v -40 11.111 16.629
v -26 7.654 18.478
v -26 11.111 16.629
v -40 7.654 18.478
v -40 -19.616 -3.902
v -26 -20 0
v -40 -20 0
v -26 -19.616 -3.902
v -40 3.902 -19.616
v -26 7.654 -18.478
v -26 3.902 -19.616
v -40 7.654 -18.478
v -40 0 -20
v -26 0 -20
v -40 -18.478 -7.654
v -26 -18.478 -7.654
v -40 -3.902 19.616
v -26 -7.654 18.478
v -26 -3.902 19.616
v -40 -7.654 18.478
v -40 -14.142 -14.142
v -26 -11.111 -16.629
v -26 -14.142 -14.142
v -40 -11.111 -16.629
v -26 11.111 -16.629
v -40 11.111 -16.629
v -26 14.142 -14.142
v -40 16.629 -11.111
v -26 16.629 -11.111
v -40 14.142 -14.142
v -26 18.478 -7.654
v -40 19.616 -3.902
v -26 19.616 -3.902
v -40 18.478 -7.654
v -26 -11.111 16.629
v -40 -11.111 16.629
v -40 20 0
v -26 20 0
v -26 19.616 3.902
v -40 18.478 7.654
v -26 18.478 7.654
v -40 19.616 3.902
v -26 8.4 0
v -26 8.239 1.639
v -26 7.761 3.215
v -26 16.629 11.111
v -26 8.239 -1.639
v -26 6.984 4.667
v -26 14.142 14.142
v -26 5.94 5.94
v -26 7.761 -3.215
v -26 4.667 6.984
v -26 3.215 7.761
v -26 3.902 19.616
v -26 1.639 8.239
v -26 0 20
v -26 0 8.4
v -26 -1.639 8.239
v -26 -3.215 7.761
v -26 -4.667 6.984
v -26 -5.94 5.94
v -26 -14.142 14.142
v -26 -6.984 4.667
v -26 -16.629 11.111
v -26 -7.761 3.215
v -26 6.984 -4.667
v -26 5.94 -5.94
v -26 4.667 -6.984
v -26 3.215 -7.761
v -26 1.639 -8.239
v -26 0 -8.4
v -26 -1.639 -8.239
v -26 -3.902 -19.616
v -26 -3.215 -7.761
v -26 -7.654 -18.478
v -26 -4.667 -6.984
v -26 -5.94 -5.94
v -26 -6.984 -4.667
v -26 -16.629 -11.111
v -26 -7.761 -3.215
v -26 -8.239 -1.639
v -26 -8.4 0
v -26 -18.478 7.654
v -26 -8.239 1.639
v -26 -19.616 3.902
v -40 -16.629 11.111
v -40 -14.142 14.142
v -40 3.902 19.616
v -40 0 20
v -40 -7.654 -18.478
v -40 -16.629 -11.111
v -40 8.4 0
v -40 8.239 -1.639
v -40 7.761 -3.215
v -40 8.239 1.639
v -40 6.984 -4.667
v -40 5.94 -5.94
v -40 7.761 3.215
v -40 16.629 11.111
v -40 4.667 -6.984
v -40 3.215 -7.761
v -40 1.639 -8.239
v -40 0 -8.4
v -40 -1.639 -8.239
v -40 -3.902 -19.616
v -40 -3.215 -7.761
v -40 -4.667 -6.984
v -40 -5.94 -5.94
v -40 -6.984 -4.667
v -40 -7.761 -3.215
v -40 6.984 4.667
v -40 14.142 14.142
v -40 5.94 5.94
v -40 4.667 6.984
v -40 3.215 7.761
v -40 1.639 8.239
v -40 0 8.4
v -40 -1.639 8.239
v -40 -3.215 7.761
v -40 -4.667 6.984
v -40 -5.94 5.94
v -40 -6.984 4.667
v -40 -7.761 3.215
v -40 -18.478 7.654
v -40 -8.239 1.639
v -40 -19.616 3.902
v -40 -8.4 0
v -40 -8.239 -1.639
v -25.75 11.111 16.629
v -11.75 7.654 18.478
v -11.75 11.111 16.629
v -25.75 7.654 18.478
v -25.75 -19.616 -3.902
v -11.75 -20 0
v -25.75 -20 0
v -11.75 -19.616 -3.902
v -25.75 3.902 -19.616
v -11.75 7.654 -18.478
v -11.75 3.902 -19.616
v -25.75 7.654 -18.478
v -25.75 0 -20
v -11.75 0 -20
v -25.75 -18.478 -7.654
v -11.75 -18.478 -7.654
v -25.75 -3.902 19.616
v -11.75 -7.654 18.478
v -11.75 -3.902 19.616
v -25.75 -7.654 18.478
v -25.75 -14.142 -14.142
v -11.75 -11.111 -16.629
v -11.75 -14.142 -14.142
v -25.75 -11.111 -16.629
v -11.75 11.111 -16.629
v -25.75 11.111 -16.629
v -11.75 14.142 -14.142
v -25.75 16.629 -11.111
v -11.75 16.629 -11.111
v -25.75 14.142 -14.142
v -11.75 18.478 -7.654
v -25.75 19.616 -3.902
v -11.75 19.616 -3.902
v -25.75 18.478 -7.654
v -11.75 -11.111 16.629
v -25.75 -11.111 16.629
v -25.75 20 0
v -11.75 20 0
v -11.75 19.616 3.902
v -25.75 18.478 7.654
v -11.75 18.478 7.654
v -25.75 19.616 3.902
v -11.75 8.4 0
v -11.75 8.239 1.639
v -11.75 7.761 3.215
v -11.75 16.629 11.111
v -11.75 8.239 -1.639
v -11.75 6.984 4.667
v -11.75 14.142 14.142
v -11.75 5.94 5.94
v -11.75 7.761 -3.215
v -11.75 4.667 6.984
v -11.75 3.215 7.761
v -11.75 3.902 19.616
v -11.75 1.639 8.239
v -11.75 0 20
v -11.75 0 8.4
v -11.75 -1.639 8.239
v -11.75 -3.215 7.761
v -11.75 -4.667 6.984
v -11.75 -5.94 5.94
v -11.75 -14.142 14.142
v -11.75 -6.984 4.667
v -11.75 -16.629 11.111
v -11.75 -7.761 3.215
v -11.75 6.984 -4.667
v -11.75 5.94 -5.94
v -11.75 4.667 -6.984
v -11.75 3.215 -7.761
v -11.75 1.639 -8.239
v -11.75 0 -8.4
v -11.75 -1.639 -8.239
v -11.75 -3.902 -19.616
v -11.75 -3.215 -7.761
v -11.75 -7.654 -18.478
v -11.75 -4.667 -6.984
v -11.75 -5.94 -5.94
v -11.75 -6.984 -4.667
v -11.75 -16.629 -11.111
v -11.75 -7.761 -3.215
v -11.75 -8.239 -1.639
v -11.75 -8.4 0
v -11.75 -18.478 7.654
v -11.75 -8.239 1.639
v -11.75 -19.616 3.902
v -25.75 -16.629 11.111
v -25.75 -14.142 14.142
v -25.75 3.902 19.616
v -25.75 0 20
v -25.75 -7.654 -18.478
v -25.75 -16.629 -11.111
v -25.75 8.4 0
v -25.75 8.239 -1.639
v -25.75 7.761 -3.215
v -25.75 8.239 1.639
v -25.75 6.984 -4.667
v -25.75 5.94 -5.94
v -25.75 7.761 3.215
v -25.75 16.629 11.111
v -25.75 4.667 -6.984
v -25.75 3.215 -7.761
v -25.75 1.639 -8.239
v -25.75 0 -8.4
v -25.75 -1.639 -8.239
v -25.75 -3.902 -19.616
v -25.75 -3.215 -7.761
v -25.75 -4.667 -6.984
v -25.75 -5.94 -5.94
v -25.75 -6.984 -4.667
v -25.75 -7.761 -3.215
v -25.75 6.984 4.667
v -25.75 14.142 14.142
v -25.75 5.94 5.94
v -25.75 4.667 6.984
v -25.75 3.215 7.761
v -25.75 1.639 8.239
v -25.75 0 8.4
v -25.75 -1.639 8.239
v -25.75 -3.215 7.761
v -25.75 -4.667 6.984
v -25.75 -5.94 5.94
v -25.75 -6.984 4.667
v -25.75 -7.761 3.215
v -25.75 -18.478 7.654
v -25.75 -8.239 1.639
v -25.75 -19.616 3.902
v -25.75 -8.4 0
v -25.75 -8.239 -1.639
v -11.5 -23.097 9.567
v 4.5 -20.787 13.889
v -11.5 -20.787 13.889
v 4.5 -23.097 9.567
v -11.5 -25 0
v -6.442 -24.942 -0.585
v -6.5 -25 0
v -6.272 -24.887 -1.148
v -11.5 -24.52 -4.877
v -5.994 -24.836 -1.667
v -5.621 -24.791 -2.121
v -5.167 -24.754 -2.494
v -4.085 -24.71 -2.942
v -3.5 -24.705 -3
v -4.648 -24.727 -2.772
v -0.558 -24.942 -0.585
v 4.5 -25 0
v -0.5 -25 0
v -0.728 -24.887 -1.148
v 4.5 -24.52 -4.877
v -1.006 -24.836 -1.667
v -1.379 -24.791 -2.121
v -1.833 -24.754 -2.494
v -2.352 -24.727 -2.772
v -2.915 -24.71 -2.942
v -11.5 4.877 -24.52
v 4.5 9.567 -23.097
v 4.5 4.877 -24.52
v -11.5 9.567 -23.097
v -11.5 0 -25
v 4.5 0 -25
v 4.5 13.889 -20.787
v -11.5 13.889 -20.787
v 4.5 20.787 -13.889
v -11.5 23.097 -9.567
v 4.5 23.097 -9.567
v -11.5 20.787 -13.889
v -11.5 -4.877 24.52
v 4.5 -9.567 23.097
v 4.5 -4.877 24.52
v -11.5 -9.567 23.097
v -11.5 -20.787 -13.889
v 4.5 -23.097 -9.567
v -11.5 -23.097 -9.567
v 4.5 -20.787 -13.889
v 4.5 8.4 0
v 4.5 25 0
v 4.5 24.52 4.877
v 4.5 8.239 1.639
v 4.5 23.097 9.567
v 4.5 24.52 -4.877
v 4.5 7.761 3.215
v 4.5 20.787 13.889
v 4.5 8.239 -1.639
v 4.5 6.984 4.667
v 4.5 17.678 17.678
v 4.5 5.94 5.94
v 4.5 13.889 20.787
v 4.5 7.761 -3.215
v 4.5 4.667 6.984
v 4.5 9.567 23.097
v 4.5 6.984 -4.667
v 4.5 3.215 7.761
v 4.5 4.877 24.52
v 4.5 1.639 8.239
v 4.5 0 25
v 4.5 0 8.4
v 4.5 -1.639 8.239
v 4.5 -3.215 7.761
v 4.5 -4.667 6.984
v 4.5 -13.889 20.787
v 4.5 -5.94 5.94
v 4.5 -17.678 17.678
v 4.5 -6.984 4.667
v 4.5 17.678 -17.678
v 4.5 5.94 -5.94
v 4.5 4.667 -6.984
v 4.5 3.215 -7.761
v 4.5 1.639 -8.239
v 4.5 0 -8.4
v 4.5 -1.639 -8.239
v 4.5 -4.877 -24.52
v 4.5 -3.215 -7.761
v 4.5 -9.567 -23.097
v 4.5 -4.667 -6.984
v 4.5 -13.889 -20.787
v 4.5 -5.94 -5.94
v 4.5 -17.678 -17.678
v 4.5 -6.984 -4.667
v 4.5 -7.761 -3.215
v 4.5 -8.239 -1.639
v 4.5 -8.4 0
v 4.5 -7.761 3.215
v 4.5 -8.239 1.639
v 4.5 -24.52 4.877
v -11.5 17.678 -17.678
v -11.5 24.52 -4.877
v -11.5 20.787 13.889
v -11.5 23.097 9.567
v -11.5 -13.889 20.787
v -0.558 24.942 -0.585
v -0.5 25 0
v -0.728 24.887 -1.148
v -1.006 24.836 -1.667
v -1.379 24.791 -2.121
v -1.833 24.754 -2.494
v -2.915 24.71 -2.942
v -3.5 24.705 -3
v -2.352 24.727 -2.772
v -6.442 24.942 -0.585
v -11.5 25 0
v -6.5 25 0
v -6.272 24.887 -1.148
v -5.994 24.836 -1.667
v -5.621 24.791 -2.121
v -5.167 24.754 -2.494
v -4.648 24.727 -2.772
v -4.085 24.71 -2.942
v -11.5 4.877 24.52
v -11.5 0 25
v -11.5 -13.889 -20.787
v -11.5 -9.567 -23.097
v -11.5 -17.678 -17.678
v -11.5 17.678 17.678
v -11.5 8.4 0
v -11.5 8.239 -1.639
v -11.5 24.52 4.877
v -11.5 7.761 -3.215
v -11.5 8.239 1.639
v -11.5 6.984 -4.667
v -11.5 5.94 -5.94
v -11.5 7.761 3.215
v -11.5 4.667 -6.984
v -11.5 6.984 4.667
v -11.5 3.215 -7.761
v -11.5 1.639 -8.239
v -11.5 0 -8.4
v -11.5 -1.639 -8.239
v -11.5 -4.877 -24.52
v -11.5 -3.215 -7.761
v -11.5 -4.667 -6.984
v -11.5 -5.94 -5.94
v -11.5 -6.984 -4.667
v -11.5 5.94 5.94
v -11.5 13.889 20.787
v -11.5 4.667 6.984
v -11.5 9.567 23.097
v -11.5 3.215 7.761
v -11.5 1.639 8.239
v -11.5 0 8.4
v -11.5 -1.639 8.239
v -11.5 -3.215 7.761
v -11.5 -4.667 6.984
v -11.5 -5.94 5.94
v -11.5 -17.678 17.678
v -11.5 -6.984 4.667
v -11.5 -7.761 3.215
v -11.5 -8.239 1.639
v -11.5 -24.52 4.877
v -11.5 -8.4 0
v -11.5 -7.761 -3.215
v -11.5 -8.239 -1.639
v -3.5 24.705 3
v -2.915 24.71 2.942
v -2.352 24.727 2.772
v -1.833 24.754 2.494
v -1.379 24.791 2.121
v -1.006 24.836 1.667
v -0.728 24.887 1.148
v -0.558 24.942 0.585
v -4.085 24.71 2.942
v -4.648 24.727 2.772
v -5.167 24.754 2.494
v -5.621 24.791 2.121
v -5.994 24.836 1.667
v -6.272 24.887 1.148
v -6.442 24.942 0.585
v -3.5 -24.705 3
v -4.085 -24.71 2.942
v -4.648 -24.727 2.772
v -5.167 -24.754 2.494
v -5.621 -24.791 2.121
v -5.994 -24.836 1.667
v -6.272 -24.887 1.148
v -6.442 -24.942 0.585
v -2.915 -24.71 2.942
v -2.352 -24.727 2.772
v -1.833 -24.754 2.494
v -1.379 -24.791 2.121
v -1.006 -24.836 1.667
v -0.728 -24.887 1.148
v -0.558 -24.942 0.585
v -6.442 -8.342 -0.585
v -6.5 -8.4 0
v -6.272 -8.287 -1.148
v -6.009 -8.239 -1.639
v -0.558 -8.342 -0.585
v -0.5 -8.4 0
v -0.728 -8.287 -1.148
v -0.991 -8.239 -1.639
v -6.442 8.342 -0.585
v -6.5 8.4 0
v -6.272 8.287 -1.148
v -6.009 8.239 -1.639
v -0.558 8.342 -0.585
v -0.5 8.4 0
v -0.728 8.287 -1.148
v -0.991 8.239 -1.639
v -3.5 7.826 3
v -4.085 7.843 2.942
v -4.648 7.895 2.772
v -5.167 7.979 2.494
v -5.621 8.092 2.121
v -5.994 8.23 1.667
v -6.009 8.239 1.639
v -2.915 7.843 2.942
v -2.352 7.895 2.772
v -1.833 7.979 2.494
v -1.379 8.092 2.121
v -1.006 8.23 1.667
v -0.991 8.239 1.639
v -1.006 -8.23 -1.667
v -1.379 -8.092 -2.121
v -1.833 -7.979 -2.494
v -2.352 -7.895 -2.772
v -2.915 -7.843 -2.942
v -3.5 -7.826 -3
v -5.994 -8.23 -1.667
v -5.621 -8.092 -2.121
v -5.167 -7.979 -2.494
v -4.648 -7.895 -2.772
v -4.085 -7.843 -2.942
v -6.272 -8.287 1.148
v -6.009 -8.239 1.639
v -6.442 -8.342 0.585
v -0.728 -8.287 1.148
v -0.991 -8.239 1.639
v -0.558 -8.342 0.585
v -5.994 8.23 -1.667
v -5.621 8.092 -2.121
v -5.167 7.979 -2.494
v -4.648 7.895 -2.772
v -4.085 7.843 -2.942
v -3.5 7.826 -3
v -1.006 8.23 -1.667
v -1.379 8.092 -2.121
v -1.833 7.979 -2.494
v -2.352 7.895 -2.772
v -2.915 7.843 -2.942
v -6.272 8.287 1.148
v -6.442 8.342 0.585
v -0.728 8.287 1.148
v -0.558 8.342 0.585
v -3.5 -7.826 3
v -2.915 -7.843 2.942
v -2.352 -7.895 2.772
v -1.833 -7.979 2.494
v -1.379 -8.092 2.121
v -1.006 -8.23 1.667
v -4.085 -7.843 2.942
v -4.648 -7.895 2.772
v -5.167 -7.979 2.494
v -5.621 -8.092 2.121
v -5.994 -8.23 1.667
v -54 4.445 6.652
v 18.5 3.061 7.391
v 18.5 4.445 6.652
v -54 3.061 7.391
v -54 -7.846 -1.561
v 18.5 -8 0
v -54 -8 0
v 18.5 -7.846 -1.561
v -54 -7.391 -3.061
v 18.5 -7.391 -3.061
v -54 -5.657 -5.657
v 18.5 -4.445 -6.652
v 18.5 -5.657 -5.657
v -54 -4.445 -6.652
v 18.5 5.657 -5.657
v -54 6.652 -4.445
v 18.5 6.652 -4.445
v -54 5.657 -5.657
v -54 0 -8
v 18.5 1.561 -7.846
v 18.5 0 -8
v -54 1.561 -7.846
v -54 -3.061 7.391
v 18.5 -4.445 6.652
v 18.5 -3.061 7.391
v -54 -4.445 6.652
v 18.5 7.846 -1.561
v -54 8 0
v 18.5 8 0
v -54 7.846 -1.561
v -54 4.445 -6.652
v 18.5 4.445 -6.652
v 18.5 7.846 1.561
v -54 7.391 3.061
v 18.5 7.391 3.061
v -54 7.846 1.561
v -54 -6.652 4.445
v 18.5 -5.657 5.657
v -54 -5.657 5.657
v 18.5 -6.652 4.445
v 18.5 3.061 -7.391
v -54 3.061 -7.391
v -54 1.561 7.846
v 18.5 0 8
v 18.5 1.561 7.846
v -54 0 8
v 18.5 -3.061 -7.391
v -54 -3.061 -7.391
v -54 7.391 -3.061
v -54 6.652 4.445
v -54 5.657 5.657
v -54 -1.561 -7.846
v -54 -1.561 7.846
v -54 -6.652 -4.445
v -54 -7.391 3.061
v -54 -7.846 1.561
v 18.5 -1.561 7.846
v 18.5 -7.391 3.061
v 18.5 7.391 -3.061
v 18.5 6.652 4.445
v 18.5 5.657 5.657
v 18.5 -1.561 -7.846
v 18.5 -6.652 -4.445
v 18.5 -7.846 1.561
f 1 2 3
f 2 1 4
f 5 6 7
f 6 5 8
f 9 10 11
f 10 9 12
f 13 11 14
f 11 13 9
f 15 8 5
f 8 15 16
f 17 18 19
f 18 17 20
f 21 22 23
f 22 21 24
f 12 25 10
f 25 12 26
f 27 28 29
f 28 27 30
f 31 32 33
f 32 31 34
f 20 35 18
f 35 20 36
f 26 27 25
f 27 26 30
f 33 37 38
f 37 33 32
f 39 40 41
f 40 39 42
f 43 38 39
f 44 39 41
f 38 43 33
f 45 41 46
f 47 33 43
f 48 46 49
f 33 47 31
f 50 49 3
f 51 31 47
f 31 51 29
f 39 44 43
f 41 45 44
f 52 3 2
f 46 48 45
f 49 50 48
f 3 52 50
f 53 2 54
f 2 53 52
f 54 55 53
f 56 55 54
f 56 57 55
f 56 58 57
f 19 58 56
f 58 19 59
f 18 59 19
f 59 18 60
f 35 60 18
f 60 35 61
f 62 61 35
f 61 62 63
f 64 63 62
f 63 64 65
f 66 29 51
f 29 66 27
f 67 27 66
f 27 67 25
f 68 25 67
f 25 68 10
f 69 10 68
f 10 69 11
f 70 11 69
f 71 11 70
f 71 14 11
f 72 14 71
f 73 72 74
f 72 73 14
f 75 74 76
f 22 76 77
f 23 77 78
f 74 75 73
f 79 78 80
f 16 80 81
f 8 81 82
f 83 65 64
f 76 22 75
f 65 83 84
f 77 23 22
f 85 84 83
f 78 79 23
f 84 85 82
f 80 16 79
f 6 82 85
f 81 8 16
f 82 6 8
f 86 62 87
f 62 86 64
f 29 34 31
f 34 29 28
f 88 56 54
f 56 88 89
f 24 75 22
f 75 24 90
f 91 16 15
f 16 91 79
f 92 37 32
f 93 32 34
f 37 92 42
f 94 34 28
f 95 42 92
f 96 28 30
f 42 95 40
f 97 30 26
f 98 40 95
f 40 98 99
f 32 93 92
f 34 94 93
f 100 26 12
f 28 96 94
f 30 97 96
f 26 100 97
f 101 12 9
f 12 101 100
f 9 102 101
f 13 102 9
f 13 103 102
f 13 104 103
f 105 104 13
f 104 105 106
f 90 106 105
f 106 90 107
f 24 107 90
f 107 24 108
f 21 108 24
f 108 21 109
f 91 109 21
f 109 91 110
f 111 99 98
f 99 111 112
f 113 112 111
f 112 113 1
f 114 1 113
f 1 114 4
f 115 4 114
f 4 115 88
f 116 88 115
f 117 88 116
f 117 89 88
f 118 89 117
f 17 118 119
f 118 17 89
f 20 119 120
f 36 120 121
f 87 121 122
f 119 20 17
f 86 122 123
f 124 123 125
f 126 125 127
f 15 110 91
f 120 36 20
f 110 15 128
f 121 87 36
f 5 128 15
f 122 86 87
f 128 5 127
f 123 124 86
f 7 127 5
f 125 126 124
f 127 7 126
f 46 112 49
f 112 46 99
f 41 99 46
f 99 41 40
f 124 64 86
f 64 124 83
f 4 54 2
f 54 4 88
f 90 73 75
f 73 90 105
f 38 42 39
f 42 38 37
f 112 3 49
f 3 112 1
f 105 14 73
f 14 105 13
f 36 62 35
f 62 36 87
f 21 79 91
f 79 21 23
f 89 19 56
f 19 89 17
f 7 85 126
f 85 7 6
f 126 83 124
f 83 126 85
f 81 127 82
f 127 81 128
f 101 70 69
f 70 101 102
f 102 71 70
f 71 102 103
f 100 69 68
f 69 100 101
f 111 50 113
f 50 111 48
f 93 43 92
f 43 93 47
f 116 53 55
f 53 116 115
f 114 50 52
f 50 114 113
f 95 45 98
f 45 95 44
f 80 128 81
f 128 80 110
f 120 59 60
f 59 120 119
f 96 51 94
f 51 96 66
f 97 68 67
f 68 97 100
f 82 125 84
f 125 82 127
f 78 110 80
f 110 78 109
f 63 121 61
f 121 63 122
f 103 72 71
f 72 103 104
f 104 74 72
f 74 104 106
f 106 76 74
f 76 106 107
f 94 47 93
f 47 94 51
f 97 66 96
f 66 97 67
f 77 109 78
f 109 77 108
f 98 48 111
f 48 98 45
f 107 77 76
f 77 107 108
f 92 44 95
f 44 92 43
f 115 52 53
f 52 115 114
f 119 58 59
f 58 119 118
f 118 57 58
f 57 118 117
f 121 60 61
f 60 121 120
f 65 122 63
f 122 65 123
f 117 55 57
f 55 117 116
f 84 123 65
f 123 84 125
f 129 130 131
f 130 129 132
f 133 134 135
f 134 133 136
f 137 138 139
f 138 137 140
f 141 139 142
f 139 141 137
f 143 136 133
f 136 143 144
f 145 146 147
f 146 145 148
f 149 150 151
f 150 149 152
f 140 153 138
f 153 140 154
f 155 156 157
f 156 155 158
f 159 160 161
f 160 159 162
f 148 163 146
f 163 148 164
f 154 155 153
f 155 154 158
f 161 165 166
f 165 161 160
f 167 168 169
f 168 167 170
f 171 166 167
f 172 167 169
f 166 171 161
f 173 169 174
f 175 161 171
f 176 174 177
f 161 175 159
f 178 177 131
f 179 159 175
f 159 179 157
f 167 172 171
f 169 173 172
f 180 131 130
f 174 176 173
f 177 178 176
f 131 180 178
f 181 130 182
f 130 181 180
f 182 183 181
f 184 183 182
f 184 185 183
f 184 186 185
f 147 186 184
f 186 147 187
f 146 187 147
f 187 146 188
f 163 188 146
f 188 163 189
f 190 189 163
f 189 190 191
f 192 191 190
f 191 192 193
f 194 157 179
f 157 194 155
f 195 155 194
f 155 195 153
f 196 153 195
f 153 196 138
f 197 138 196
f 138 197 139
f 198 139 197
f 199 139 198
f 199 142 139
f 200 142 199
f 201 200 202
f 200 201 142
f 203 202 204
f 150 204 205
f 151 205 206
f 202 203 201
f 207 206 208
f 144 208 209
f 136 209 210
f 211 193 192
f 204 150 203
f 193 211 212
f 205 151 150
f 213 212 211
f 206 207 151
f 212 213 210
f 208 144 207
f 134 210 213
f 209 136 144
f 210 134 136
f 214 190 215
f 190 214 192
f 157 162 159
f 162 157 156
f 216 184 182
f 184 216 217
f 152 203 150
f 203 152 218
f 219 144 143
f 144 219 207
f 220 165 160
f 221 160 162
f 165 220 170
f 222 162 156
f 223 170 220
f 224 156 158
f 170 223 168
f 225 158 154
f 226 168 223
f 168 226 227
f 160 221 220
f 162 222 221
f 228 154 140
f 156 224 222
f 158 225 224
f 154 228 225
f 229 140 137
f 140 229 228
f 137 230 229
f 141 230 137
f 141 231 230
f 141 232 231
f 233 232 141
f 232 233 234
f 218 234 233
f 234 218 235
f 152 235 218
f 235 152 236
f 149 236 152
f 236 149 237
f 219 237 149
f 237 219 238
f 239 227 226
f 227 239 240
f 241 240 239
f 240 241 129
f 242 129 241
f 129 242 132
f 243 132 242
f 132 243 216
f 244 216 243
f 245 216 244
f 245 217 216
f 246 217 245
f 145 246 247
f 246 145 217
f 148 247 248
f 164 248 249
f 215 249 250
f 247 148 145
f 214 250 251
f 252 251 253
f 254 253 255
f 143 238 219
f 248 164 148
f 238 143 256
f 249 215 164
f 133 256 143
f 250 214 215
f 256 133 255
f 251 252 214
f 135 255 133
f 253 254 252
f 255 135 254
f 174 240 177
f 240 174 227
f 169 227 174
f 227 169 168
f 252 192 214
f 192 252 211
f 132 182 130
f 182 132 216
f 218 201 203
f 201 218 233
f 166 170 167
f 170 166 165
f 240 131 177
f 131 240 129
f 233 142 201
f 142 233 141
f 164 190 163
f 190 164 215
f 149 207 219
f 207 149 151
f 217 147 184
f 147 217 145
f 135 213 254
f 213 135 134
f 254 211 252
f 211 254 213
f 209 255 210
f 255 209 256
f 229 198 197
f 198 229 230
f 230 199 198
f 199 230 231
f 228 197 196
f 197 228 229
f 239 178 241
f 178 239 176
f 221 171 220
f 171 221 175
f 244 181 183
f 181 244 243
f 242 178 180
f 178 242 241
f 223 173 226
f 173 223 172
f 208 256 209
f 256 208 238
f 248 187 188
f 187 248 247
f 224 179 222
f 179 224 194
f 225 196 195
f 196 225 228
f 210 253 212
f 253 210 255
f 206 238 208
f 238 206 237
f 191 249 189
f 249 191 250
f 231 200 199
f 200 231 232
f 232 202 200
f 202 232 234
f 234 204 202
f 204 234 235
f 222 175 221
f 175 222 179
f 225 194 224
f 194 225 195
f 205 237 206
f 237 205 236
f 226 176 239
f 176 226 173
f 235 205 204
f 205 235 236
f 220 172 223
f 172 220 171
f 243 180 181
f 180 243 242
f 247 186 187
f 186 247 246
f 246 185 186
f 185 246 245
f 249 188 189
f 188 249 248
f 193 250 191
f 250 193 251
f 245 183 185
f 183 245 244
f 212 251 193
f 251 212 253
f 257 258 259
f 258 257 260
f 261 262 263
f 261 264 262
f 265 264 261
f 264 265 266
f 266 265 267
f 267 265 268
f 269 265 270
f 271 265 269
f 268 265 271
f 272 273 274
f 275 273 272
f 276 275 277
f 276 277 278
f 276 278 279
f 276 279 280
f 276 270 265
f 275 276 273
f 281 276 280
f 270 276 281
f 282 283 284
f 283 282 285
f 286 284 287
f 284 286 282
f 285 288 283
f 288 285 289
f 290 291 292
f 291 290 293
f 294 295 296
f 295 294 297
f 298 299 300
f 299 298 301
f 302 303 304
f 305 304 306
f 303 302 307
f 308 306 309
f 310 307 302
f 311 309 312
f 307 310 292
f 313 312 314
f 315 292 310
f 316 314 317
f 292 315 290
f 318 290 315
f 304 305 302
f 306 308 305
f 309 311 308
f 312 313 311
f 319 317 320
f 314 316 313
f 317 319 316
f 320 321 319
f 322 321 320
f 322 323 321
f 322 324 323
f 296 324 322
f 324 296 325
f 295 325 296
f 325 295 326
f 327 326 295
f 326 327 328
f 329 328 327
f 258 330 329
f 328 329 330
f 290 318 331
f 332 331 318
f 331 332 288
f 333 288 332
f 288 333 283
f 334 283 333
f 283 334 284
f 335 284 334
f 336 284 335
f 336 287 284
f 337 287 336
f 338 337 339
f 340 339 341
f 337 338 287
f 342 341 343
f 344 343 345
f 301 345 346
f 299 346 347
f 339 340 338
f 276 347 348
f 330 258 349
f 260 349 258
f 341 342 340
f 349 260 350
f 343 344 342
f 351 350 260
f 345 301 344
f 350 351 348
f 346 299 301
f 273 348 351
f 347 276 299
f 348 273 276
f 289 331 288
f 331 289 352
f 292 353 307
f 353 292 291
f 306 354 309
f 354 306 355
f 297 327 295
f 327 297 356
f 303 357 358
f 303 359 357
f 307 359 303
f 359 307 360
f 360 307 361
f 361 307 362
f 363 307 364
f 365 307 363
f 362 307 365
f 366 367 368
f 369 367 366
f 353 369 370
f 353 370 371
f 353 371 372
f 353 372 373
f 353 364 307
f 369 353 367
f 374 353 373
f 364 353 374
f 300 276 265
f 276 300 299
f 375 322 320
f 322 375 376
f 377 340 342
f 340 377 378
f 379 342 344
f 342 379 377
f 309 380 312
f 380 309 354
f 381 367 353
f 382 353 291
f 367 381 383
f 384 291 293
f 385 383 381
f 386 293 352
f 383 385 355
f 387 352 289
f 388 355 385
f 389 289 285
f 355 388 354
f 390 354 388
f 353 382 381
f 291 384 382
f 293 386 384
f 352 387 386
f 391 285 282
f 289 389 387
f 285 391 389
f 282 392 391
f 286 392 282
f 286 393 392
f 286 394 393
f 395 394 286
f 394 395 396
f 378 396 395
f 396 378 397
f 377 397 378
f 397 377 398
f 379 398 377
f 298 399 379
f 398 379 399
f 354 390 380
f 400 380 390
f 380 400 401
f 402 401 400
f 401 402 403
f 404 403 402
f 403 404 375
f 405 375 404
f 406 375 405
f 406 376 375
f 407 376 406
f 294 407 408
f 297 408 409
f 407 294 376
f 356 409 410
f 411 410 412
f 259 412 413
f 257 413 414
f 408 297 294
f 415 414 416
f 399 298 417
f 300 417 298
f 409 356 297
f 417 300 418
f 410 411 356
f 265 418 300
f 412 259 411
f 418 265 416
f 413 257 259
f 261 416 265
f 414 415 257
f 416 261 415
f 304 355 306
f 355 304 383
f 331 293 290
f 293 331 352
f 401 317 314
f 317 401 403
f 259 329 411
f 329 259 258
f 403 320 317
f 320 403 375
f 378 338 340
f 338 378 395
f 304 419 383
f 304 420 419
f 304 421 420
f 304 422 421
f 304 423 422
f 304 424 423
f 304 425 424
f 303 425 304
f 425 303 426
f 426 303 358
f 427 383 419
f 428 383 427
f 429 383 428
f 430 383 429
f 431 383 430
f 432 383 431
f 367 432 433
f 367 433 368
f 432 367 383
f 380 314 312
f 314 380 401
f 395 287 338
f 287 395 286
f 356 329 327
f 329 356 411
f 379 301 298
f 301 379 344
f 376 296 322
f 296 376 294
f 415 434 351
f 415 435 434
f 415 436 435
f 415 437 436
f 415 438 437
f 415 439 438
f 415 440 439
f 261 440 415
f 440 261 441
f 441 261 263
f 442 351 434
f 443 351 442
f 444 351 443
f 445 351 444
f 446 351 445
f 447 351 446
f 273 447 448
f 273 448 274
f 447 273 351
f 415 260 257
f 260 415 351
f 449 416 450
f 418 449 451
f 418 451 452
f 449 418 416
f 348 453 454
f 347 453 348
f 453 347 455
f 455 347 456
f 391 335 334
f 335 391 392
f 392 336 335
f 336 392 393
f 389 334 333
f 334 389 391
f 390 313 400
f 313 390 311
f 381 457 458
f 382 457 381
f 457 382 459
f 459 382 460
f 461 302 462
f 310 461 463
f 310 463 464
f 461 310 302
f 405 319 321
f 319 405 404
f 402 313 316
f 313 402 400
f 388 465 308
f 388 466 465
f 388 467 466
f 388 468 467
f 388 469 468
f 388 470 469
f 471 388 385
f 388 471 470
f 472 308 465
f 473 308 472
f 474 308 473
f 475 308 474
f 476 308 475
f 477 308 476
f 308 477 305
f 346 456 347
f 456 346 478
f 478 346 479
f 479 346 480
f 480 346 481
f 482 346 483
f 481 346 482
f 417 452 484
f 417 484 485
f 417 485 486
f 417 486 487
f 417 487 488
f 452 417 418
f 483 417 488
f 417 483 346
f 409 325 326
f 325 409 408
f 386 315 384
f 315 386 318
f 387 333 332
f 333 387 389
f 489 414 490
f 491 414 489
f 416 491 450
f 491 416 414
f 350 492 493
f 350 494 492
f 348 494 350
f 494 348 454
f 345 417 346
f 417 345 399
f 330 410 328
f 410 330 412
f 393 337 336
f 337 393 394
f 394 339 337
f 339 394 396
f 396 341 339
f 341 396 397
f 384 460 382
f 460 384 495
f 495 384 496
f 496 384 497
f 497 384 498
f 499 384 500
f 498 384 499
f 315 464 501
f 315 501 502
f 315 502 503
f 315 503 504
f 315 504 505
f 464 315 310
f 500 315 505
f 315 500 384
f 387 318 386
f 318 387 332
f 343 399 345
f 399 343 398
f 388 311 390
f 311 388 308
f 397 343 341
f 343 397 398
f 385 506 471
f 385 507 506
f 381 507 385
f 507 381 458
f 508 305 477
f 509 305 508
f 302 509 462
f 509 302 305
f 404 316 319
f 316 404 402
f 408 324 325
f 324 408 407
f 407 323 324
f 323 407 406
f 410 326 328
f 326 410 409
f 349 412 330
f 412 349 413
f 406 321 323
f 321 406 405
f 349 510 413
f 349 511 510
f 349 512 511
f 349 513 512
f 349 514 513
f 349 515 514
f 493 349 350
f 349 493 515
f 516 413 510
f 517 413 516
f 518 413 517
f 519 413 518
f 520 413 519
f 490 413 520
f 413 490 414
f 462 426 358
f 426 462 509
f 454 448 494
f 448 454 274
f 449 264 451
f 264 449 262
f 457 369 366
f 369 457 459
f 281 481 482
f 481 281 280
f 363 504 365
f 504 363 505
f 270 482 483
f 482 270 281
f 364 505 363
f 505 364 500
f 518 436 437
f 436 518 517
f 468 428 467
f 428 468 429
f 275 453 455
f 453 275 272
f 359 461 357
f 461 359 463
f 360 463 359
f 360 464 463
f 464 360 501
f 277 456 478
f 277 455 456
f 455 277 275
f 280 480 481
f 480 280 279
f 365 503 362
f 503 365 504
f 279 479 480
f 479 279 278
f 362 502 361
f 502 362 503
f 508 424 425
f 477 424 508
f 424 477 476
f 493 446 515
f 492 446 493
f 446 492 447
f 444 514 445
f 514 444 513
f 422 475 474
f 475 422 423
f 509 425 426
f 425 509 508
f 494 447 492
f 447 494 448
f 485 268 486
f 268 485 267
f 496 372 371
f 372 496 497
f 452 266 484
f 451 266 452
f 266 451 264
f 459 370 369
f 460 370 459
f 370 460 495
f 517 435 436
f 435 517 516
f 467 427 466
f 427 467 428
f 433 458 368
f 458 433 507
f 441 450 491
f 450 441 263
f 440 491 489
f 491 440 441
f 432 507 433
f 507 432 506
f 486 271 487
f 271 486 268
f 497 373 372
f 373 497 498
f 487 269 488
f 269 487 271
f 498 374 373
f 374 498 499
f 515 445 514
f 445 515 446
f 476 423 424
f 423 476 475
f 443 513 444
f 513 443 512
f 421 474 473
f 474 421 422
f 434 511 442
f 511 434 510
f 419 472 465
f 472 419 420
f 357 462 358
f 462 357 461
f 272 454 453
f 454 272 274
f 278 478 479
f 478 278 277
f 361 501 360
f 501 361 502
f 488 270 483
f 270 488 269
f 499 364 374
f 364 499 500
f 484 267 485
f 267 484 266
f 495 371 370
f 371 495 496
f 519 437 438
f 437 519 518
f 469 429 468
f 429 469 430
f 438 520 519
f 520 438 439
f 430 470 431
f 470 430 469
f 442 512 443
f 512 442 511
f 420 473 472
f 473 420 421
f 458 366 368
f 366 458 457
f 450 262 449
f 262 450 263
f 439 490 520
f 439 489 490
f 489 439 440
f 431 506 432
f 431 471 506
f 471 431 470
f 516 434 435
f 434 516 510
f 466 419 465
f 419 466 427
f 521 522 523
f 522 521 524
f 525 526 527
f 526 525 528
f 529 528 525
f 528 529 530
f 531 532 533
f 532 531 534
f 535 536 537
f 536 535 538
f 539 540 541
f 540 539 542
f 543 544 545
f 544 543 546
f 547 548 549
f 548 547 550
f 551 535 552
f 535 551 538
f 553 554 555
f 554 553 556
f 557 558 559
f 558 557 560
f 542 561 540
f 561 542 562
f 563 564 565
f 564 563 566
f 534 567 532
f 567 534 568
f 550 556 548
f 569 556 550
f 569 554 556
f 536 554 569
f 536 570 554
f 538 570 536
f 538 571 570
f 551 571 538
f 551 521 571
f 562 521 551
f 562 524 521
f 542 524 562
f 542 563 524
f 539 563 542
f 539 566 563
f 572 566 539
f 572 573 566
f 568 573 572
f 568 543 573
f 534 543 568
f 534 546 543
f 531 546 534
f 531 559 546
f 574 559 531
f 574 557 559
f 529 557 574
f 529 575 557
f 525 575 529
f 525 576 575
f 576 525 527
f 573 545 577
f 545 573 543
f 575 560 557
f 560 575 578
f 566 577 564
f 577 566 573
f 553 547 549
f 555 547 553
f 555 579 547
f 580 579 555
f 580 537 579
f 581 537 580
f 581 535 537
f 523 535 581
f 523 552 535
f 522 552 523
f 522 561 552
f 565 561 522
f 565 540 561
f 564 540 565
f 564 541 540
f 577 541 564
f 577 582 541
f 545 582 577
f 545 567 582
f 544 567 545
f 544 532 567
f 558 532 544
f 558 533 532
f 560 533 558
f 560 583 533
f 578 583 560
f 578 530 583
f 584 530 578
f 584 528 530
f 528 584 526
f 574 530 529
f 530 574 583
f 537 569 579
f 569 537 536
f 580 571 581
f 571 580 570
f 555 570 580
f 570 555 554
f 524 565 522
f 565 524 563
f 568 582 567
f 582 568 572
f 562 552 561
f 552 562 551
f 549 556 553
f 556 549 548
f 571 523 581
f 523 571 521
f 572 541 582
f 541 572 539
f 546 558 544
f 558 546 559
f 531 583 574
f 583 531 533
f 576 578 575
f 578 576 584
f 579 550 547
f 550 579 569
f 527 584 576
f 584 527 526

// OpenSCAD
$fn = 32;

// ------------------------------------------------------------------------
// Shaft with rings and collars: d16 shaft, 3 rings
// Every part is its own module, assembly() places them once.
// ------------------------------------------------------------------------

// --- part 1 ---
module shaft() {
  translate([0, 0, -36.25]) cylinder(h = 72.5, d = 16);
}

// --- part 2 ---
module spacer_a() {
  difference() {
      translate([0, 0, 0]) cylinder(h = 14, d = 40);
      translate([0, 0, -1]) cylinder(h = 16, d = 16.8);
    }
}

// --- part 3 ---
module spacer_b() {
  difference() {
      translate([0, 0, 0]) cylinder(h = 14, d = 40);
      translate([0, 0, -1]) cylinder(h = 16, d = 16.8);
    }
}

// --- part 4 ---
module collar_a() {
  difference() {
    cylinder(h = 16, d = 50);
    translate([0, 0, -1]) cylinder(h = 18, d = 16.8);
    translate([0, 0, 8]) rotate([90, 0, 0]) cylinder(h = 52, d = 6, center = true);
  }
}

// --- assembly ---
module assembly() {
  translate([-17.75, 0, 0]) rotate([0, 90, 0]) shaft();
  translate([-40, 0, 0]) rotate([0, 90, 0]) spacer_a();
  translate([-25.75, 0, 0]) rotate([0, 90, 0]) spacer_b();
  translate([-11.5, 0, 0]) rotate([0, 90, 0]) collar_a();
}

assembly();
